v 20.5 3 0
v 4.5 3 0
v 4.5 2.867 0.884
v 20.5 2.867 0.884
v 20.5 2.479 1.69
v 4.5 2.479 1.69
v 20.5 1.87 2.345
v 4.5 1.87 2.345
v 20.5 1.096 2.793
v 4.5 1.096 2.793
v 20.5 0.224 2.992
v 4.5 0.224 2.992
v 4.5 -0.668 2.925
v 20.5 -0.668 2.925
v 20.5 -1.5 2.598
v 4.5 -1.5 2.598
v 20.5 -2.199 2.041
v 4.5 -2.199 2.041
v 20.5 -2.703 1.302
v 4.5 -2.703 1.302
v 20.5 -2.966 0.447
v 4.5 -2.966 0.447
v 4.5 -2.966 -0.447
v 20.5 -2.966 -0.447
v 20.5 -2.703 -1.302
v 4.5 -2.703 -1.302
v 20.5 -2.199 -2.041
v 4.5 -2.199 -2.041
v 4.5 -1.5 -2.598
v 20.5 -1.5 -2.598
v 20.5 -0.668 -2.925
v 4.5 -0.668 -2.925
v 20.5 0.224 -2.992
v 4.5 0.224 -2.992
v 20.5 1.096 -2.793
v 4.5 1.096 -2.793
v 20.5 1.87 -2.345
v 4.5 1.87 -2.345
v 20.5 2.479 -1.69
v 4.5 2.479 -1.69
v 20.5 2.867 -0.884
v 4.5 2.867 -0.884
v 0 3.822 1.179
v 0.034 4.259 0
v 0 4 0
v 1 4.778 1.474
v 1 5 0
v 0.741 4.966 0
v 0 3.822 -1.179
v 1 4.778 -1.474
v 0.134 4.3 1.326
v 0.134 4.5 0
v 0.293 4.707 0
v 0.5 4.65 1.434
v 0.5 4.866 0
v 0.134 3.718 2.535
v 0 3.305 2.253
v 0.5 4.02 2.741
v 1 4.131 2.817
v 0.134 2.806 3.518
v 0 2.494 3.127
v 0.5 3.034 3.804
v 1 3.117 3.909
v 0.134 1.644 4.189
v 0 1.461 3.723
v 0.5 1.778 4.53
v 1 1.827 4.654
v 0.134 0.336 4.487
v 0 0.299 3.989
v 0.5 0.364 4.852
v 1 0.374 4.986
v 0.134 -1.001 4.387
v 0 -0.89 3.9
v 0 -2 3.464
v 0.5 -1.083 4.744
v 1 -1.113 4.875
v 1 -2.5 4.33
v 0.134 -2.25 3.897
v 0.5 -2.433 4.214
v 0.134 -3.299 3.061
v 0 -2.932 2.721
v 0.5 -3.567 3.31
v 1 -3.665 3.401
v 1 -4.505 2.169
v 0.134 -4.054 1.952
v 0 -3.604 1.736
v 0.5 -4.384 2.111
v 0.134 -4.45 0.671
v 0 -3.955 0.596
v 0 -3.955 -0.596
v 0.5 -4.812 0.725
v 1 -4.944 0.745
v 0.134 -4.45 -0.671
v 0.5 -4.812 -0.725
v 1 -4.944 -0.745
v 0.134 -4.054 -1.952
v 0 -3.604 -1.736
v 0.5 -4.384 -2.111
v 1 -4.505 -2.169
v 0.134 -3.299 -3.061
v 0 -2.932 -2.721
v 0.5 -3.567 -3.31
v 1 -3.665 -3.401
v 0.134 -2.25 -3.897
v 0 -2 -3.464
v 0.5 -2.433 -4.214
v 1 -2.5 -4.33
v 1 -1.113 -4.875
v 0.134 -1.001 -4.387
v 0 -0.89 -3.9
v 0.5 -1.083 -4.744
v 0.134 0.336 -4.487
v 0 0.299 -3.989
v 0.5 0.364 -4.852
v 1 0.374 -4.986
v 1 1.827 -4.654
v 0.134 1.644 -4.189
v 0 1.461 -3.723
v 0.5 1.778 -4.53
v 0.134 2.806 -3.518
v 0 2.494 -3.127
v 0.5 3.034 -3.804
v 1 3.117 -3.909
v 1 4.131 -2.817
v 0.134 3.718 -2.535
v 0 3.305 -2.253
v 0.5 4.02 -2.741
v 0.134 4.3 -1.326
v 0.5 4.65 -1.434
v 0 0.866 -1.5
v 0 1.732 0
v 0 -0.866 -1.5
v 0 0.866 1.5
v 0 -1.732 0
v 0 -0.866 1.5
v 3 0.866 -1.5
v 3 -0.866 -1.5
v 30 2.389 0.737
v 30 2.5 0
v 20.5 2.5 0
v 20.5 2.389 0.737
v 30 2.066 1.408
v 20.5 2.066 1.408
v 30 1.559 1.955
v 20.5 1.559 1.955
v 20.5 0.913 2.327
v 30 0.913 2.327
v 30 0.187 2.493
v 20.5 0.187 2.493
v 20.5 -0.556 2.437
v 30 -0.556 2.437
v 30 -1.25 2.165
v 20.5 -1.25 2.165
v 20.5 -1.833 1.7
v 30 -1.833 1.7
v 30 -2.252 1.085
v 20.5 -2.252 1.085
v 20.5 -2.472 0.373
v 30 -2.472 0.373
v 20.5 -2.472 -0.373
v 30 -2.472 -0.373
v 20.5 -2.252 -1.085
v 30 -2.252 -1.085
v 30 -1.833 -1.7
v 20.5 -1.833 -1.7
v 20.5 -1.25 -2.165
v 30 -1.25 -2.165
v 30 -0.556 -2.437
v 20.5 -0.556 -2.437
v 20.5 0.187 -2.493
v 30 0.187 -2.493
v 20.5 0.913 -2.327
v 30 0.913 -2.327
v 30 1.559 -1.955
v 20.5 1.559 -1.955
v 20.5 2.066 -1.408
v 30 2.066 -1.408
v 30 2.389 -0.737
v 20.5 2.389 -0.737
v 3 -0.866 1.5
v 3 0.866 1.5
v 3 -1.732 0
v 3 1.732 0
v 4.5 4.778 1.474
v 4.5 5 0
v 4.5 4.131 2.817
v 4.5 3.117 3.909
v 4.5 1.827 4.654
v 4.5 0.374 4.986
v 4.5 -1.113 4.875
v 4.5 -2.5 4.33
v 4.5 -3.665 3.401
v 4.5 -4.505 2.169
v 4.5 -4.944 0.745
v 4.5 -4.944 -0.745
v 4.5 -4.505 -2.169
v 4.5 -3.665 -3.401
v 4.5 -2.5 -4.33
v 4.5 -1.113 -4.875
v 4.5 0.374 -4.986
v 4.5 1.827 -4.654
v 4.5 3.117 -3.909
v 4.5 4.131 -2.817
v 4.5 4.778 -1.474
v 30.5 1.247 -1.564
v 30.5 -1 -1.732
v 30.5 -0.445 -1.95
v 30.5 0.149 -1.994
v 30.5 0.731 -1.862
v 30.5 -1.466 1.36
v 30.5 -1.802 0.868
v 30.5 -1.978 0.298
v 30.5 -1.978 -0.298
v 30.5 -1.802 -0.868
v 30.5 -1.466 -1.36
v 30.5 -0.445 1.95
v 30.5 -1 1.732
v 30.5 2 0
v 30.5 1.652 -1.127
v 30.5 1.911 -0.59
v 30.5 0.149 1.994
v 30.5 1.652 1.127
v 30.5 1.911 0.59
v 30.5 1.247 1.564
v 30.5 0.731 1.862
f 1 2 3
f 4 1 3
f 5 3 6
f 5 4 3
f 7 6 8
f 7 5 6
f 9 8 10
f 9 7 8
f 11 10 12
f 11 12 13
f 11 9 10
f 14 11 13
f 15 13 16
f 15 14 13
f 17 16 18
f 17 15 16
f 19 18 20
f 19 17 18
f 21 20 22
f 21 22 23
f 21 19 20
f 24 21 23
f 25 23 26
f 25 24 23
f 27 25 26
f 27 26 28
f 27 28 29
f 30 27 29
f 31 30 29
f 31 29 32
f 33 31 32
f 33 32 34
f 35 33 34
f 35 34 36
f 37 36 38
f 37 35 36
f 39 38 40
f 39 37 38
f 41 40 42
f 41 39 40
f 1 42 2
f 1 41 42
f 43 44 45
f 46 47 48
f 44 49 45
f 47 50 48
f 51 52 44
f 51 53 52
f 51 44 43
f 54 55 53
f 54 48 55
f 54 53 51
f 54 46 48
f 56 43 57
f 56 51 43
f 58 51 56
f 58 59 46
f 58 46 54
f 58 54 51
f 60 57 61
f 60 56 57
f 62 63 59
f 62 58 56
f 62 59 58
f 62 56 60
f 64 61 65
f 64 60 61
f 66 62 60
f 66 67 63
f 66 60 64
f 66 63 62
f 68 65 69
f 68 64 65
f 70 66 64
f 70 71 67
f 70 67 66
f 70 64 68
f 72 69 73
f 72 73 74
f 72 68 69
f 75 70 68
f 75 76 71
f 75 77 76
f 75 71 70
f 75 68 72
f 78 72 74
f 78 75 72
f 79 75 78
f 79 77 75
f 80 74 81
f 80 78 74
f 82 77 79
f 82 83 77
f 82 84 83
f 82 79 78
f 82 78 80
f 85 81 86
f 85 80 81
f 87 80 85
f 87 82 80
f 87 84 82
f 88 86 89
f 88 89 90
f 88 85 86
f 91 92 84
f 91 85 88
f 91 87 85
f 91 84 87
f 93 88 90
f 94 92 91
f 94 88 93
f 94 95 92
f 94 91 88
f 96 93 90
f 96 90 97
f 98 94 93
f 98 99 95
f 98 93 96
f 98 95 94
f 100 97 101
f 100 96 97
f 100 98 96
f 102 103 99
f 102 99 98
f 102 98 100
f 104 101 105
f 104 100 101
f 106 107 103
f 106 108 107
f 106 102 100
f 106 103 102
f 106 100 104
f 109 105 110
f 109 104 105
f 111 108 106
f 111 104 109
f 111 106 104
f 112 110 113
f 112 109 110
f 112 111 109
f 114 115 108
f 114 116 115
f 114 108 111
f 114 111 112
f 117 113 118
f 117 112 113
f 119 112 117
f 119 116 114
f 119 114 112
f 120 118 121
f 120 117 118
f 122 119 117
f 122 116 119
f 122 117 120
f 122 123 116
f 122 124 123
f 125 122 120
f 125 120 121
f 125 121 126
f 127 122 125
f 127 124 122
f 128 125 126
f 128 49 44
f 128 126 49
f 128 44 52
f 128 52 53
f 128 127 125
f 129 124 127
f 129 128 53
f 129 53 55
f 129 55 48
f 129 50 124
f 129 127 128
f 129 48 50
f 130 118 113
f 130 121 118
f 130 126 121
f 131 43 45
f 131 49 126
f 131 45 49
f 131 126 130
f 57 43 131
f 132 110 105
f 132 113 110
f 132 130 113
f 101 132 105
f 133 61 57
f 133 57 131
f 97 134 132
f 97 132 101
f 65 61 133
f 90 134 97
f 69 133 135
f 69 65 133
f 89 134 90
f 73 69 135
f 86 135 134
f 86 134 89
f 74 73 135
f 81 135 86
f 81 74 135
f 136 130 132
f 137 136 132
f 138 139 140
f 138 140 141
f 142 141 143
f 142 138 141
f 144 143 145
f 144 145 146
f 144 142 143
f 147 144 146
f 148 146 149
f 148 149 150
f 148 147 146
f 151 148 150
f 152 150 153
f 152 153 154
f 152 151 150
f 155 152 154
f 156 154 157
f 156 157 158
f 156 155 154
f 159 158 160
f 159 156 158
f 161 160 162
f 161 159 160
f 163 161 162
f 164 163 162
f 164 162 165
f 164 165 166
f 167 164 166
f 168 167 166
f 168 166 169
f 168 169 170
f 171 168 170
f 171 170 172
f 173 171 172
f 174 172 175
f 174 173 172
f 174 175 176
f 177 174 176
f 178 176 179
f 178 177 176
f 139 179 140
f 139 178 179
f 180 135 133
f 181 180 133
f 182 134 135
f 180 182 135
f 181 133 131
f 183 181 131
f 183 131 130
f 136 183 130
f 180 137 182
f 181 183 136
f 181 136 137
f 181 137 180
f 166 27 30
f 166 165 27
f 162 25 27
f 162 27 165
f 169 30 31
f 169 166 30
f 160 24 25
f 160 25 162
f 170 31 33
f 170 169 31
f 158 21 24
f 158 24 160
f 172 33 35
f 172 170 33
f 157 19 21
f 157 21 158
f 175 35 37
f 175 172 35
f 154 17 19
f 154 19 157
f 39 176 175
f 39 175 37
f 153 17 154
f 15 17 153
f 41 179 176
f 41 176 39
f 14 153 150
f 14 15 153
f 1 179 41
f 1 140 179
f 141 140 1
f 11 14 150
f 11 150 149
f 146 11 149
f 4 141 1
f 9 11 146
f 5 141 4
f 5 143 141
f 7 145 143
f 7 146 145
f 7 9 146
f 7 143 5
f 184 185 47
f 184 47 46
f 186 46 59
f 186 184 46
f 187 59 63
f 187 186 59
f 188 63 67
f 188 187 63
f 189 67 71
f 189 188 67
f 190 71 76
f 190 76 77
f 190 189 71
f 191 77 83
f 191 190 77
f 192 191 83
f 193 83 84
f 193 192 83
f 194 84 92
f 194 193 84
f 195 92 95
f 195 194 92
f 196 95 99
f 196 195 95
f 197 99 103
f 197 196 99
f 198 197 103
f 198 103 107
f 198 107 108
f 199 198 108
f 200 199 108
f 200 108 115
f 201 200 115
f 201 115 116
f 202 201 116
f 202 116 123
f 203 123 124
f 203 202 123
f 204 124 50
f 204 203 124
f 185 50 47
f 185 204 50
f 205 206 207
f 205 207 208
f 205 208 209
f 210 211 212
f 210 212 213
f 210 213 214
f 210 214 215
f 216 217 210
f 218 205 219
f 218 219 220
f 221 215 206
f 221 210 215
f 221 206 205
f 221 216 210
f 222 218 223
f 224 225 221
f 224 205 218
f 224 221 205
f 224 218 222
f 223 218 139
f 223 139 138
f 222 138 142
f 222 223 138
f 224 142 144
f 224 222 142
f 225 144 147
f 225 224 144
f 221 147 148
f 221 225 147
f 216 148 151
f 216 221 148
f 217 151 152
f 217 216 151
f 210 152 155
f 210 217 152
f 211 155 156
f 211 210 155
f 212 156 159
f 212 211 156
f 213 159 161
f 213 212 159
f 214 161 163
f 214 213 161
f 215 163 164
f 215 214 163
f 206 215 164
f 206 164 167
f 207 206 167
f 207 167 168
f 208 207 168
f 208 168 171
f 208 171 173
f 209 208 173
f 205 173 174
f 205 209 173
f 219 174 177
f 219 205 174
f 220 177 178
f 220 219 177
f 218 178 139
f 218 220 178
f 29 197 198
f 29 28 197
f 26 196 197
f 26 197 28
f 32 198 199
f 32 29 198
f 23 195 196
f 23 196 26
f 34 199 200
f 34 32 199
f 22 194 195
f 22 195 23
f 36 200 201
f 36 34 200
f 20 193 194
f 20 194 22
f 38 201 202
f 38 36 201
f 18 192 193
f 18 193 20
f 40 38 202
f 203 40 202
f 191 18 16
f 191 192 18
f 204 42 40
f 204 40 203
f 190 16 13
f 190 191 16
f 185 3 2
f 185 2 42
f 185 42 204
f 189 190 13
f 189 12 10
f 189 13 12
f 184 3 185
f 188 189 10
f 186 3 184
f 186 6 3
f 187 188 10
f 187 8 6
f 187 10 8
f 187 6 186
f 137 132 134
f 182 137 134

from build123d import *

# Parameters (mm, degrees)
CUT_EXTRUDE_1_DEPTH = 3
FILLET_1_R          = 1
CHAMFER_1_SIZE      = 0.5


with BuildPart() as part:
    # 草图1 → 旋转1 (revolve)
    with BuildSketch(Plane.XY):
        Polygon((0, 0), (0, 5), (4.5, 5), (4.5, 3), (20.5, 3), (20.5, 2.5), (30.5, 2.5), (30.5, 0), align=None)
    revolve(axis=Axis((0, 0, 0), (1, 0, 0)))

    # 草图2 → 切除-拉伸1 (cut)
    with BuildSketch(Plane.ZY):
        Polygon((0, 1.732050808), (-1.5, 0.866025404), (-1.5, -0.866025404), (0, -1.732050808), (1.5, -0.866025404), (1.5, 0.866025404), align=None)
    extrude(amount=-CUT_EXTRUDE_1_DEPTH, mode=Mode.SUBTRACT)

    # 圆角1
    fillet_1_edges = [part.edges().sort_by_distance(p)[0] for p in [
        (0, -5, 0),
    ]]
    fillet(fillet_1_edges, radius=FILLET_1_R)

    # 倒角1
    chamfer_1_edges = [part.edges().sort_by_distance(p)[0] for p in [
        (30.5, -2.5, 0),
    ]]
    chamfer(chamfer_1_edges, length=CHAMFER_1_SIZE)


solid = part.part
